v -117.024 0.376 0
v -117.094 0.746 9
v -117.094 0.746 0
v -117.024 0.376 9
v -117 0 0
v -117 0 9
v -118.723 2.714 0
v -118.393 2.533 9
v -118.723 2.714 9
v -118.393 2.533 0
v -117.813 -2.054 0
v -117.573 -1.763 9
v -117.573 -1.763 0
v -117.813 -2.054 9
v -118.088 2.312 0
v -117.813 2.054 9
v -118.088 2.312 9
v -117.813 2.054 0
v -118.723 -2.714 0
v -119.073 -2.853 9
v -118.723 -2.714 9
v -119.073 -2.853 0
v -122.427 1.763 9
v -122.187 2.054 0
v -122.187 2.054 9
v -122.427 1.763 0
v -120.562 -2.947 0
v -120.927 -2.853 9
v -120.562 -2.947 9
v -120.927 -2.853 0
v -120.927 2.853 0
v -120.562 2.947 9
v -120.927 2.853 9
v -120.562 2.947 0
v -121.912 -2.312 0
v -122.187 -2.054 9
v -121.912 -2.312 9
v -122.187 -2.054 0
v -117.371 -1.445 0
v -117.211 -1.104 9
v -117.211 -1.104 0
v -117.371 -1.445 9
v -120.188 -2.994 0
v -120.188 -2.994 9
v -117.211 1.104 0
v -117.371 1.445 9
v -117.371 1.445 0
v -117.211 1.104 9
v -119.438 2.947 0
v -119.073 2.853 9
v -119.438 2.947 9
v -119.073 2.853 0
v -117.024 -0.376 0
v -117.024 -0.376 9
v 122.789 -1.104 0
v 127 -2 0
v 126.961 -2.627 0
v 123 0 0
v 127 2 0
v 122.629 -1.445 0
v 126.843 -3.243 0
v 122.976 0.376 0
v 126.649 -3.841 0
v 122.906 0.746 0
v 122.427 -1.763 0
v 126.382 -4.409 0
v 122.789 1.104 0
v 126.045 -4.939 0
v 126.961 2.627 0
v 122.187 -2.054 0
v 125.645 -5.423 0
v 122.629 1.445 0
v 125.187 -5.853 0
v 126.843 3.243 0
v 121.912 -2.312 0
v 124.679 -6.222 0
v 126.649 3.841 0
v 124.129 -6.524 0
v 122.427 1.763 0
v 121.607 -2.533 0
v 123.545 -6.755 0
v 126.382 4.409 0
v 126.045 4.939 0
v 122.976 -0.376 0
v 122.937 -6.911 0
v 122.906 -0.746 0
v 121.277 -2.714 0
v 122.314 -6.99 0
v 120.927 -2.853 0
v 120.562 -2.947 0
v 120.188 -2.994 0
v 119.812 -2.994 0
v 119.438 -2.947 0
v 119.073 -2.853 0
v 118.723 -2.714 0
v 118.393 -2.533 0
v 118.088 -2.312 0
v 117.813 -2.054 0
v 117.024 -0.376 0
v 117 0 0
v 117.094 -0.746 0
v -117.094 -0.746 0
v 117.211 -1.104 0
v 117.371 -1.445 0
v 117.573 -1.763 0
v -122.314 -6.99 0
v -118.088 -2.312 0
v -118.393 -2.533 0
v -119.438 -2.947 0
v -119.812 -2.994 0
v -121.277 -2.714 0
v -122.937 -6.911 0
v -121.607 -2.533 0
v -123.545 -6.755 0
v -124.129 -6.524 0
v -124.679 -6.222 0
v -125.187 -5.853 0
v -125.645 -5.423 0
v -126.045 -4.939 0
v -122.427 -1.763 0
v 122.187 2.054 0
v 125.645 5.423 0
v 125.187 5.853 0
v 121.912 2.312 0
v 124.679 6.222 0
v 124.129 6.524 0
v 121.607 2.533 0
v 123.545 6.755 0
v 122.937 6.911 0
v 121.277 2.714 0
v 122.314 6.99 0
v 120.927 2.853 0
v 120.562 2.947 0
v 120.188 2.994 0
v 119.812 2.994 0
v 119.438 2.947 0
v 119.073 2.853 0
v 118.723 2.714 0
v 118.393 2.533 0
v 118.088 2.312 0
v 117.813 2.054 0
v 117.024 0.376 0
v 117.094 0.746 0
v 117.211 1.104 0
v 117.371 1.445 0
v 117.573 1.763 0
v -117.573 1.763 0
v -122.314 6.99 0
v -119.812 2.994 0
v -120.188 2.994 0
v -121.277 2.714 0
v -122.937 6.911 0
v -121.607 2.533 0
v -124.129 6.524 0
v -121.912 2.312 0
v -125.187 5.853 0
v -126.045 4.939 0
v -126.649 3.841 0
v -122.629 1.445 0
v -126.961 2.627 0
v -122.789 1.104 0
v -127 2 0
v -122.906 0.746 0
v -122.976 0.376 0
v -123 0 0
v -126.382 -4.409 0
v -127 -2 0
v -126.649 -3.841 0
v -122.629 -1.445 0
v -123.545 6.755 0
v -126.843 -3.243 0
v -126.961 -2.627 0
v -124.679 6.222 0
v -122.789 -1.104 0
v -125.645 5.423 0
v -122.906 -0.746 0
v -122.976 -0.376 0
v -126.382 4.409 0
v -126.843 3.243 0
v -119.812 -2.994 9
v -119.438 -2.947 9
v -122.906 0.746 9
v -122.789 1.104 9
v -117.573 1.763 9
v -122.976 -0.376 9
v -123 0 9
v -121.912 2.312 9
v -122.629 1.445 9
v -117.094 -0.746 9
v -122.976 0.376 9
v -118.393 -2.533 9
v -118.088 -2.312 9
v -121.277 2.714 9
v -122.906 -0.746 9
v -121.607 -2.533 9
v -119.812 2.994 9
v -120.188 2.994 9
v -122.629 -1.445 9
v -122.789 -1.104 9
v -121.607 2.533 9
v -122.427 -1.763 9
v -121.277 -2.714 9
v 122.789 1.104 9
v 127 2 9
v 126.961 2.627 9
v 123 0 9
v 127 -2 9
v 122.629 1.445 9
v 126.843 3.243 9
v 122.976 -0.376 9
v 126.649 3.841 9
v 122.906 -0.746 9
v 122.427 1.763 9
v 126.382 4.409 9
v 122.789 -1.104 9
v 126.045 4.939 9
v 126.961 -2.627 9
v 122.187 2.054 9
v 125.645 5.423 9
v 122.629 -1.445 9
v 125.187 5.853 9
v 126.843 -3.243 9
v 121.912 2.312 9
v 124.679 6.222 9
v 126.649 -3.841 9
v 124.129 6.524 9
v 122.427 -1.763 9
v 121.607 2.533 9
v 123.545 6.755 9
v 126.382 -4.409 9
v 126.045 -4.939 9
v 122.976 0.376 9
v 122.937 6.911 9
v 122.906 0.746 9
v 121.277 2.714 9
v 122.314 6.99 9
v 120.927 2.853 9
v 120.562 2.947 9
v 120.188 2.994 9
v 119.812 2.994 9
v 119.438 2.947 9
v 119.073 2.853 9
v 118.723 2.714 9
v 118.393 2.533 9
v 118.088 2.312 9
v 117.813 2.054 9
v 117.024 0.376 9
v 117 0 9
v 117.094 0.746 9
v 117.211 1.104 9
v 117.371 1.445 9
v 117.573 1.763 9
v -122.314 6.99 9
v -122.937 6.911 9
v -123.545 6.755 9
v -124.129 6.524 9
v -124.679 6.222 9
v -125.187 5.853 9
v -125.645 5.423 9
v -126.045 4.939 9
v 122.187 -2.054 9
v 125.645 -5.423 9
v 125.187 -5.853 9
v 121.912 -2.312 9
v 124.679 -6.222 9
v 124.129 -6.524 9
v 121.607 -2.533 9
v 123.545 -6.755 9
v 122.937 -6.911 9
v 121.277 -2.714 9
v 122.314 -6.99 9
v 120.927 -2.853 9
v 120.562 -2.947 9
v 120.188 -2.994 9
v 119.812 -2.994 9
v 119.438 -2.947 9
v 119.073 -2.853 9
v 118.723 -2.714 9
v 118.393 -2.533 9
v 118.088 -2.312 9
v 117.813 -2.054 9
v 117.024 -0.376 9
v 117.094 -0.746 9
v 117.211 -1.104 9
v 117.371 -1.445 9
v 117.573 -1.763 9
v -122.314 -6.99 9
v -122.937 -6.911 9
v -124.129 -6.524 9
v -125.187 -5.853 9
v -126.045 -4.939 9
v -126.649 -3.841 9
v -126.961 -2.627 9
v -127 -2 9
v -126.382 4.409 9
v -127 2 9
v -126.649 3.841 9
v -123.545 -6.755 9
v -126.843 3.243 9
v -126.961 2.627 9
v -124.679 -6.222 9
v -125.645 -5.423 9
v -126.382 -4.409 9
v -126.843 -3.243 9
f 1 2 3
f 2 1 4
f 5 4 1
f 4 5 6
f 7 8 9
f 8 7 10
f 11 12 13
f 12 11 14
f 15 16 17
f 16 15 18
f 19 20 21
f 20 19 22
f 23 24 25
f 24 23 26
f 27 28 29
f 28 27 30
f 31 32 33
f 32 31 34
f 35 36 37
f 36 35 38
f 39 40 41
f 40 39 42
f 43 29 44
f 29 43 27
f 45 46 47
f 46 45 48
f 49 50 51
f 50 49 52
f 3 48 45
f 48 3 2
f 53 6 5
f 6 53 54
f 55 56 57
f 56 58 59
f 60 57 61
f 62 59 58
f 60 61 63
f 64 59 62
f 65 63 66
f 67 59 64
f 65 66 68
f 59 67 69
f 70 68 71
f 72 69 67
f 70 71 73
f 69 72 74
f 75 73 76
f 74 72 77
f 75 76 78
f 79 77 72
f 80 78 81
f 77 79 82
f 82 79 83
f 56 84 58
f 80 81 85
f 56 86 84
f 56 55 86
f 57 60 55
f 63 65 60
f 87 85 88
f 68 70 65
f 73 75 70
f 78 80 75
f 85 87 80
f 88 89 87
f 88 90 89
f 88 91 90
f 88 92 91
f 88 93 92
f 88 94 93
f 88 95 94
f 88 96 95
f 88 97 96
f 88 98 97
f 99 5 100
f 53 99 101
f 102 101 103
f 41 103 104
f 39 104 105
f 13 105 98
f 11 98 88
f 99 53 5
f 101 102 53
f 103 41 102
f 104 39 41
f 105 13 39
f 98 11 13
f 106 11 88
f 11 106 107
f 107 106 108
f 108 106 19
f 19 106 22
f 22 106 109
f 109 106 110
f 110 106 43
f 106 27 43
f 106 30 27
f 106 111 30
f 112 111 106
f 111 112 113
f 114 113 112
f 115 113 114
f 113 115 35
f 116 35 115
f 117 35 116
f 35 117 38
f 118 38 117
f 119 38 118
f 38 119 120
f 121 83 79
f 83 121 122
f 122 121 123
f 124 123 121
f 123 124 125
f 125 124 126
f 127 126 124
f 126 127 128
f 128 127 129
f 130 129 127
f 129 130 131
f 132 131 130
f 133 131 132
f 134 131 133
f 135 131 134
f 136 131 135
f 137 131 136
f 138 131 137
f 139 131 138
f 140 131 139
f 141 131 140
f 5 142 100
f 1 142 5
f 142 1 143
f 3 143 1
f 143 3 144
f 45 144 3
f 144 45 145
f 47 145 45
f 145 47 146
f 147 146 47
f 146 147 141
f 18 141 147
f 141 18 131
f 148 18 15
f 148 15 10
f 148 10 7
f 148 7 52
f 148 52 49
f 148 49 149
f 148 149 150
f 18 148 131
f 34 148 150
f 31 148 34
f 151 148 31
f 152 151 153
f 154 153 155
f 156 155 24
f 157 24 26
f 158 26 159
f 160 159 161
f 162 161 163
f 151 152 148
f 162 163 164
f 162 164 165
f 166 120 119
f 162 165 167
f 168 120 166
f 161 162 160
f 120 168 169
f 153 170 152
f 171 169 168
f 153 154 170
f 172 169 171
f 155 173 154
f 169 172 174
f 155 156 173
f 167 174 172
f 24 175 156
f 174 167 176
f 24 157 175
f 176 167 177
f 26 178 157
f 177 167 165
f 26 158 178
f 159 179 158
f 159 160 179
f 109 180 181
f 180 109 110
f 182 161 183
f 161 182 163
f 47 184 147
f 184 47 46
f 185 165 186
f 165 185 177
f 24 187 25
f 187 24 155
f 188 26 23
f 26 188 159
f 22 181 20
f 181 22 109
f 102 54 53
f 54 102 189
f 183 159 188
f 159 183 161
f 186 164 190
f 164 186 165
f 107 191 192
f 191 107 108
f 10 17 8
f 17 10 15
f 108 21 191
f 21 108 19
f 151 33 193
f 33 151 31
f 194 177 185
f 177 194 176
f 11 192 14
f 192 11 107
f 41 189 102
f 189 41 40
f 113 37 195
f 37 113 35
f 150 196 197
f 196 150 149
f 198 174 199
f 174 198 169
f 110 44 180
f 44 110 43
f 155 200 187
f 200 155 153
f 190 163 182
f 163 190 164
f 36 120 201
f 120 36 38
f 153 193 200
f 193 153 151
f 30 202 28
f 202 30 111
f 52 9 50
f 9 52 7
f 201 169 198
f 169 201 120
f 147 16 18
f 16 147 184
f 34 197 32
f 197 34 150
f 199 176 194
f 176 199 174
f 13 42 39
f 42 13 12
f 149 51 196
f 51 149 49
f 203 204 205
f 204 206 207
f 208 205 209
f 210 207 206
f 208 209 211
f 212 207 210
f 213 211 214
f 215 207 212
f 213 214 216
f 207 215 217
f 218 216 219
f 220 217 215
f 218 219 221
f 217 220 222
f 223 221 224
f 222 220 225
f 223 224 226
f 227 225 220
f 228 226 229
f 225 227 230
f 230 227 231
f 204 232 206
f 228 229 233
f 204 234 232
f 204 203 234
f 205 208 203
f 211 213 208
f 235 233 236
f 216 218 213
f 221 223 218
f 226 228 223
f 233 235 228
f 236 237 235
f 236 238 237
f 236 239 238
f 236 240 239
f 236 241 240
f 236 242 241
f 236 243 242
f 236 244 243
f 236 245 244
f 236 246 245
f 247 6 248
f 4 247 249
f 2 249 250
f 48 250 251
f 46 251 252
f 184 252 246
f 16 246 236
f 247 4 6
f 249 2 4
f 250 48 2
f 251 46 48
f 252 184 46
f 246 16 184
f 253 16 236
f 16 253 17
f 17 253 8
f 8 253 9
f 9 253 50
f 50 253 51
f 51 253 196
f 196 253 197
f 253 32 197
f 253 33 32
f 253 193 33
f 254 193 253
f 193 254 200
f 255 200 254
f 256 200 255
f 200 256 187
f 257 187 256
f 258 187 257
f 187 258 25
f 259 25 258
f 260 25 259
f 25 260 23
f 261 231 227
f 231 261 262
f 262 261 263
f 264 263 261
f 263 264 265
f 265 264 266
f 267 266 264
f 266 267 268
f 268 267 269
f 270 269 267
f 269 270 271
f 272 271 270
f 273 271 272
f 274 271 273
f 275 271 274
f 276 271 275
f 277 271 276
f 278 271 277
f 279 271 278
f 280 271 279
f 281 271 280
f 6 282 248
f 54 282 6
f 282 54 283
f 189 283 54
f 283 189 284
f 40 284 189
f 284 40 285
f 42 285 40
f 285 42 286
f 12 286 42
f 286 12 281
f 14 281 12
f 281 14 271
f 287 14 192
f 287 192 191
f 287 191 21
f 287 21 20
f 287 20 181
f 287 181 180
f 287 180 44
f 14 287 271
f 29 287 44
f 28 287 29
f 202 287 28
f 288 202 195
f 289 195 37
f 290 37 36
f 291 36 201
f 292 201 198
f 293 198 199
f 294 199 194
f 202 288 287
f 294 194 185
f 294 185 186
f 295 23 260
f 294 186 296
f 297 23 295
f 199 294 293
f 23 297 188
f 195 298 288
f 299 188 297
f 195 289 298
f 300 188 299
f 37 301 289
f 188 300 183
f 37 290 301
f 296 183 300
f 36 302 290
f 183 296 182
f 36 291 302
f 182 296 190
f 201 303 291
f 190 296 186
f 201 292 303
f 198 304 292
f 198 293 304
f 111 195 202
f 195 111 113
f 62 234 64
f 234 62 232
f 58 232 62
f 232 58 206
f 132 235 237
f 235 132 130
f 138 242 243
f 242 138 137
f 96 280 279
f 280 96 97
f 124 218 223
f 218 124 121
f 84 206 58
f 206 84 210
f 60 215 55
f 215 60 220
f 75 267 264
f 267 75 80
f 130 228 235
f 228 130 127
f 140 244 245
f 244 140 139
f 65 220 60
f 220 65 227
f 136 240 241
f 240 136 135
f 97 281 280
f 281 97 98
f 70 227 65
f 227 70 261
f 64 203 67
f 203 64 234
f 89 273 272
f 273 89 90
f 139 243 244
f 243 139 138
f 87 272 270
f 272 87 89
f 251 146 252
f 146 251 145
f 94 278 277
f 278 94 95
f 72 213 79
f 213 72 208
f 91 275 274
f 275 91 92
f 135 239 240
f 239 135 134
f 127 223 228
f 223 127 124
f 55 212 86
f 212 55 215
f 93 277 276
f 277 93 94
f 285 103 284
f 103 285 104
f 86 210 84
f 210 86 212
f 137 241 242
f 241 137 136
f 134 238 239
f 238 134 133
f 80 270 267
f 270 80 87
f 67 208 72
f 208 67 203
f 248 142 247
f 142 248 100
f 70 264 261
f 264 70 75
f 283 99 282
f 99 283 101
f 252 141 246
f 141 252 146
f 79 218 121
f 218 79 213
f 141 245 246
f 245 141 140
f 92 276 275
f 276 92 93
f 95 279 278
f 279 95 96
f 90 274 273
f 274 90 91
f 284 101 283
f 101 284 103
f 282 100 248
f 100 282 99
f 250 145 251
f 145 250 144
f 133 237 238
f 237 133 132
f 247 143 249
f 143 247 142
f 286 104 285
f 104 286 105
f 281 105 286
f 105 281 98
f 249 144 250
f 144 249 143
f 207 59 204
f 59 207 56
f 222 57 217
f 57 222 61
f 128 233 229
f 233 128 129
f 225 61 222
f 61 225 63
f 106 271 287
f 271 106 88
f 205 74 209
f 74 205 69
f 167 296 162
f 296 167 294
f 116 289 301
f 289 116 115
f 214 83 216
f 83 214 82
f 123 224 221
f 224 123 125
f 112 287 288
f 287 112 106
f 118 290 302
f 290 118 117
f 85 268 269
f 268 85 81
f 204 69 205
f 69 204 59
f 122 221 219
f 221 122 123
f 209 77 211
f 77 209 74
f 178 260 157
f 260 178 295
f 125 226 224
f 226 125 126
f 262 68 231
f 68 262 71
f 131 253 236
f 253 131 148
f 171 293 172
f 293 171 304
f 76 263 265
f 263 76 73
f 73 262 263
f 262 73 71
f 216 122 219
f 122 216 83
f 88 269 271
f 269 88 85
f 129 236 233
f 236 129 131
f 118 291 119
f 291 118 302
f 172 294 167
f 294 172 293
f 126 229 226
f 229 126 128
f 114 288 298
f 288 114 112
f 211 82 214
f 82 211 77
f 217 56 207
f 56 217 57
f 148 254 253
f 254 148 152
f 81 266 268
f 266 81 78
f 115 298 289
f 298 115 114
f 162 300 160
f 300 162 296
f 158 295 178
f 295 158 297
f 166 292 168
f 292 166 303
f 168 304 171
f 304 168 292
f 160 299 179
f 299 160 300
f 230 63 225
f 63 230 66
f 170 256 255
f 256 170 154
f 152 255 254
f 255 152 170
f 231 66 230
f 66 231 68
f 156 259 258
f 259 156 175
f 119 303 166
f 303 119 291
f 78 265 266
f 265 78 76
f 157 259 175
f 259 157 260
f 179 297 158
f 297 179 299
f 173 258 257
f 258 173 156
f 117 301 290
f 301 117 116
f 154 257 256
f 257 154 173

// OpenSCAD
$fn = 50;


difference() {
	union() {
		hull() {
			translate(v = [-122.0000000000, 2.0000000000, 0]) {
				cylinder(h = 9, r = 5);
			}
			translate(v = [122.0000000000, 2.0000000000, 0]) {
				cylinder(h = 9, r = 5);
			}
			translate(v = [-122.0000000000, -2.0000000000, 0]) {
				cylinder(h = 9, r = 5);
			}
			translate(v = [122.0000000000, -2.0000000000, 0]) {
				cylinder(h = 9, r = 5);
			}
		}
	}
	union() {
		translate(v = [-120.0000000000, 0.0000000000, 0]) {
			cylinder(h = 9, r = 3.0000000000);
		}
		translate(v = [120.0000000000, 0.0000000000, 0]) {
			cylinder(h = 9, r = 3.0000000000);
		}
		translate(v = [-120.0000000000, 0.0000000000, 0]) {
			cylinder(h = 9, r = 1.5000000000);
		}
		translate(v = [120.0000000000, 0.0000000000, 0]) {
			cylinder(h = 9, r = 1.5000000000);
		}
		translate(v = [-120.0000000000, 0.0000000000, 0]) {
			cylinder(h = 9, r = 1.5000000000);
		}
		translate(v = [120.0000000000, 0.0000000000, 0]) {
			cylinder(h = 9, r = 1.5000000000);
		}
		translate(v = [-120.0000000000, 0.0000000000, 0]) {
			cylinder(h = 9, r = 1.5000000000);
		}
		translate(v = [120.0000000000, 0.0000000000, 0]) {
			cylinder(h = 9, r = 1.5000000000);
		}
	}
}
